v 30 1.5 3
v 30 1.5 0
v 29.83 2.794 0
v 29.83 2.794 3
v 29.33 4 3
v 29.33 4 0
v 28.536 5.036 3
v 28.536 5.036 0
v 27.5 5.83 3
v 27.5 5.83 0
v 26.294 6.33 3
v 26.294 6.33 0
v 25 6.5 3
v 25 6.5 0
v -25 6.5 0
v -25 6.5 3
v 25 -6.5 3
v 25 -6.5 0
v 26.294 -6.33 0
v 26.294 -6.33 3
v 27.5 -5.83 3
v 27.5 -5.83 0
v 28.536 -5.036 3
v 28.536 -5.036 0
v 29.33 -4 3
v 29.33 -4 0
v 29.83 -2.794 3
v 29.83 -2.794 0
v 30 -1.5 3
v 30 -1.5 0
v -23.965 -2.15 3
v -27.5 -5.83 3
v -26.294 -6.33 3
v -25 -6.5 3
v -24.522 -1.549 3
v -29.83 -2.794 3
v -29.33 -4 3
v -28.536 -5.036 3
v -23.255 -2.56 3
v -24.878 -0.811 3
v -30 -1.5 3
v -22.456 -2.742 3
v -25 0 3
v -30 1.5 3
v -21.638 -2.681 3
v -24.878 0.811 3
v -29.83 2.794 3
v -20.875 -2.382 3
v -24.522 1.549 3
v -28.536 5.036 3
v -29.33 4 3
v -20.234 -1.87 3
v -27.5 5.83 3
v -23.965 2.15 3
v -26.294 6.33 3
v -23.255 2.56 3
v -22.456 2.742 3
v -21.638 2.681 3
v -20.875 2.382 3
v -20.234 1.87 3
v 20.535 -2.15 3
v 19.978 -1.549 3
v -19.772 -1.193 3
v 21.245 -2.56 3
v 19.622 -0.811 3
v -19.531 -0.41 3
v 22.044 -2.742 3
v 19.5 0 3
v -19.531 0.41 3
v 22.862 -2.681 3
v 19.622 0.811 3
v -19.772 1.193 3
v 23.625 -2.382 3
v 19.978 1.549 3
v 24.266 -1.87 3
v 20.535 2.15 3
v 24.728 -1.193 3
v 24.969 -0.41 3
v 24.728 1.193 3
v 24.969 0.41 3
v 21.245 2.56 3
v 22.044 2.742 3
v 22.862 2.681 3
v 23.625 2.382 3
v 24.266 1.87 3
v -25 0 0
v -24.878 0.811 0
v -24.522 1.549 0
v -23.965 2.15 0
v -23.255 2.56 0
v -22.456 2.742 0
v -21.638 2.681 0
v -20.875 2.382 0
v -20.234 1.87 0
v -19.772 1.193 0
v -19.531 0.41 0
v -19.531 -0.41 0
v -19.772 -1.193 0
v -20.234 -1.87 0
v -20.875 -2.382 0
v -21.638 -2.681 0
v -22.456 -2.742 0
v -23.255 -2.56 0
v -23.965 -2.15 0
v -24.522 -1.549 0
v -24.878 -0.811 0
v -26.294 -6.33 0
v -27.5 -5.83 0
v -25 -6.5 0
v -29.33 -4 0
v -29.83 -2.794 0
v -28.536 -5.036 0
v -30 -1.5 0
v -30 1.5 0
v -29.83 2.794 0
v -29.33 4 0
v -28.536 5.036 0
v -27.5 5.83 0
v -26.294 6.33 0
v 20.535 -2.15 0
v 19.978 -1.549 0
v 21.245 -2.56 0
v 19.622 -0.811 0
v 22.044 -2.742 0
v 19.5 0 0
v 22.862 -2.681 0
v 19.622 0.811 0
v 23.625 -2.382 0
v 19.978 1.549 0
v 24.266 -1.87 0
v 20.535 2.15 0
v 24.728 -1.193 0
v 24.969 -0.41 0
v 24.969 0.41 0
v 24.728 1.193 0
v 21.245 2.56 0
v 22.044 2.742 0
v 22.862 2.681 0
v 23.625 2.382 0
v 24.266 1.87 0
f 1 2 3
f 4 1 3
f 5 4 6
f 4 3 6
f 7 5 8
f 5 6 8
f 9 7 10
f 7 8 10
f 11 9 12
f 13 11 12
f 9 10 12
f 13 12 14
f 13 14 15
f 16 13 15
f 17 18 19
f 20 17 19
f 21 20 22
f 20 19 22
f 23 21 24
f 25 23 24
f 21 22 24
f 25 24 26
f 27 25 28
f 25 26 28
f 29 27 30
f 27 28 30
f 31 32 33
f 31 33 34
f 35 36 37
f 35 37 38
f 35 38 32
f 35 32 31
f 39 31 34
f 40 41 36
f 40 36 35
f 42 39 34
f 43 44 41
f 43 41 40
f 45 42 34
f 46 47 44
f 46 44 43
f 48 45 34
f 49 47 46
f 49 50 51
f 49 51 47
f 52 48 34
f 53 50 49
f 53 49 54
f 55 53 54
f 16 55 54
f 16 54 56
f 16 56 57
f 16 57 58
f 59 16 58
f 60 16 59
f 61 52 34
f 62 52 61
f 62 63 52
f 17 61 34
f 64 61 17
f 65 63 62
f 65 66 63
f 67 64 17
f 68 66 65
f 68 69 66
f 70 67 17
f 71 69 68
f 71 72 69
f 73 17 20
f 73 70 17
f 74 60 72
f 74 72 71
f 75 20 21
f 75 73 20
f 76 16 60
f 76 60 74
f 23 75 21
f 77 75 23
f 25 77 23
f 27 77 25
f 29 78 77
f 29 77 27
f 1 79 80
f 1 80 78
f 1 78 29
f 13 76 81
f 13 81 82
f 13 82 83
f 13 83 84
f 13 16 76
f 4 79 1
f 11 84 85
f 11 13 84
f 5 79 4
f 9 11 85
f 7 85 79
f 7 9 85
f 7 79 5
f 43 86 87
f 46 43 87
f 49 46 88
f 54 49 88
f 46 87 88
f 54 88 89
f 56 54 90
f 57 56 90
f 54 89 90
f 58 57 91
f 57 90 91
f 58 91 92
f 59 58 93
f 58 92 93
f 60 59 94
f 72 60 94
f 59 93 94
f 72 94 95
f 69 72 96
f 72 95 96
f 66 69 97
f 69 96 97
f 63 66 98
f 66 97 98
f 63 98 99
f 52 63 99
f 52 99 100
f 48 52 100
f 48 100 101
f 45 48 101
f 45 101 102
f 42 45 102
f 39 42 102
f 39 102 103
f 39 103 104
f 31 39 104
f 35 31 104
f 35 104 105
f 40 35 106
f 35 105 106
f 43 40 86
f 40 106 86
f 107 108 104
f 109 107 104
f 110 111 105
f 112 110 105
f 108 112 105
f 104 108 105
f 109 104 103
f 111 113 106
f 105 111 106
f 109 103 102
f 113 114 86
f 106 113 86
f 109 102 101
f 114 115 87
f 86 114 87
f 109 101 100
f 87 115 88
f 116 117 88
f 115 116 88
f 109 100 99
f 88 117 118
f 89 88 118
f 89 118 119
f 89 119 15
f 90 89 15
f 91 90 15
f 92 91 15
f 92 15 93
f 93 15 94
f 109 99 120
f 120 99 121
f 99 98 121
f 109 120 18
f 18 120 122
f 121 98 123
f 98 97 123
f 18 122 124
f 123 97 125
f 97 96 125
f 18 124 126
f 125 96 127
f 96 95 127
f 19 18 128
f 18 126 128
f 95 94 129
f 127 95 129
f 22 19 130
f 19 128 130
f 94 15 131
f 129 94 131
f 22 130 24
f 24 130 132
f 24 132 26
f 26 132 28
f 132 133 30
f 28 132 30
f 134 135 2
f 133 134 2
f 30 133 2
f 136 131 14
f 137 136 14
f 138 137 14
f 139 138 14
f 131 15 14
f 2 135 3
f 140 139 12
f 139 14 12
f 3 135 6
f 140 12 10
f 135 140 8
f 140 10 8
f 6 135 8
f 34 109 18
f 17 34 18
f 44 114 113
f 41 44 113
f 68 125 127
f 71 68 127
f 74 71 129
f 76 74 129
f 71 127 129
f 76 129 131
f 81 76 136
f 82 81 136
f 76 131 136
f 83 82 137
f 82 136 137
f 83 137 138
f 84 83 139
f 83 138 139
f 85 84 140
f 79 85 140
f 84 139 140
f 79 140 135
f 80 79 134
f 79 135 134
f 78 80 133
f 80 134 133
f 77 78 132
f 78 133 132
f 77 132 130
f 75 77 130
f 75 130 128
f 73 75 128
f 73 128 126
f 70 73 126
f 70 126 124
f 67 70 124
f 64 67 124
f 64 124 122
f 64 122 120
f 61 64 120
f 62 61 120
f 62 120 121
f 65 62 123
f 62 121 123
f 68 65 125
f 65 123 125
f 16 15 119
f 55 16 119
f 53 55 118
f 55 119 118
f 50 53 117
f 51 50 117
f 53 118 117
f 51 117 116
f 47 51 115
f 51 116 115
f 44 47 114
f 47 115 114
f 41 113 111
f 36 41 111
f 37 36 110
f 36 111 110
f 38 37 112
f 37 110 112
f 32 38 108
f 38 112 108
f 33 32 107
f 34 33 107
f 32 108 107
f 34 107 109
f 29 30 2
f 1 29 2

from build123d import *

# Parameters (mm, degrees)
F1_DEPTH = 3


with BuildPart() as f1:
    # F0 (on Top) → F1 (new body)
    with BuildSketch(Plane.XY):
        with BuildLine():
            Line((-25, -6.5), (25, -6.5))
            ThreePointArc((25, -6.5), (28.535534, -5.035534), (30, -1.5))
            Line((30, -1.5), (30, 0))
            Line((30, 0), (25, 0))
            ThreePointArc((25, 0), (22.25, -2.75), (19.5, 0))
            Line((19.5, 0), (-19.5, 0))
            ThreePointArc((-19.5, 0), (-22.25, -2.75), (-25, 0))
            Line((-25, 0), (-30, 0))
            Line((-30, 0), (-30, -1.5))
            ThreePointArc((-30, -1.5), (-28.535534, -5.035534), (-25, -6.5))
        make_face()
        with BuildLine():
            Line((25, 0), (30, 0))
            Line((30, 0), (30, 1.5))
            ThreePointArc((30, 1.5), (28.535534, 5.035534), (25, 6.5))
            Line((25, 6.5), (-25, 6.5))
            ThreePointArc((-25, 6.5), (-28.535534, 5.035534), (-30, 1.5))
            Line((-30, 1.5), (-30, 0))
            Line((-30, 0), (-25, 0))
            ThreePointArc((-25, 0), (-22.25, 2.75), (-19.5, 0))
            Line((-19.5, 0), (19.5, 0))
            ThreePointArc((19.5, 0), (22.25, 2.75), (25, 0))
        make_face()
    extrude(amount=F1_DEPTH)


solid = f1.part
